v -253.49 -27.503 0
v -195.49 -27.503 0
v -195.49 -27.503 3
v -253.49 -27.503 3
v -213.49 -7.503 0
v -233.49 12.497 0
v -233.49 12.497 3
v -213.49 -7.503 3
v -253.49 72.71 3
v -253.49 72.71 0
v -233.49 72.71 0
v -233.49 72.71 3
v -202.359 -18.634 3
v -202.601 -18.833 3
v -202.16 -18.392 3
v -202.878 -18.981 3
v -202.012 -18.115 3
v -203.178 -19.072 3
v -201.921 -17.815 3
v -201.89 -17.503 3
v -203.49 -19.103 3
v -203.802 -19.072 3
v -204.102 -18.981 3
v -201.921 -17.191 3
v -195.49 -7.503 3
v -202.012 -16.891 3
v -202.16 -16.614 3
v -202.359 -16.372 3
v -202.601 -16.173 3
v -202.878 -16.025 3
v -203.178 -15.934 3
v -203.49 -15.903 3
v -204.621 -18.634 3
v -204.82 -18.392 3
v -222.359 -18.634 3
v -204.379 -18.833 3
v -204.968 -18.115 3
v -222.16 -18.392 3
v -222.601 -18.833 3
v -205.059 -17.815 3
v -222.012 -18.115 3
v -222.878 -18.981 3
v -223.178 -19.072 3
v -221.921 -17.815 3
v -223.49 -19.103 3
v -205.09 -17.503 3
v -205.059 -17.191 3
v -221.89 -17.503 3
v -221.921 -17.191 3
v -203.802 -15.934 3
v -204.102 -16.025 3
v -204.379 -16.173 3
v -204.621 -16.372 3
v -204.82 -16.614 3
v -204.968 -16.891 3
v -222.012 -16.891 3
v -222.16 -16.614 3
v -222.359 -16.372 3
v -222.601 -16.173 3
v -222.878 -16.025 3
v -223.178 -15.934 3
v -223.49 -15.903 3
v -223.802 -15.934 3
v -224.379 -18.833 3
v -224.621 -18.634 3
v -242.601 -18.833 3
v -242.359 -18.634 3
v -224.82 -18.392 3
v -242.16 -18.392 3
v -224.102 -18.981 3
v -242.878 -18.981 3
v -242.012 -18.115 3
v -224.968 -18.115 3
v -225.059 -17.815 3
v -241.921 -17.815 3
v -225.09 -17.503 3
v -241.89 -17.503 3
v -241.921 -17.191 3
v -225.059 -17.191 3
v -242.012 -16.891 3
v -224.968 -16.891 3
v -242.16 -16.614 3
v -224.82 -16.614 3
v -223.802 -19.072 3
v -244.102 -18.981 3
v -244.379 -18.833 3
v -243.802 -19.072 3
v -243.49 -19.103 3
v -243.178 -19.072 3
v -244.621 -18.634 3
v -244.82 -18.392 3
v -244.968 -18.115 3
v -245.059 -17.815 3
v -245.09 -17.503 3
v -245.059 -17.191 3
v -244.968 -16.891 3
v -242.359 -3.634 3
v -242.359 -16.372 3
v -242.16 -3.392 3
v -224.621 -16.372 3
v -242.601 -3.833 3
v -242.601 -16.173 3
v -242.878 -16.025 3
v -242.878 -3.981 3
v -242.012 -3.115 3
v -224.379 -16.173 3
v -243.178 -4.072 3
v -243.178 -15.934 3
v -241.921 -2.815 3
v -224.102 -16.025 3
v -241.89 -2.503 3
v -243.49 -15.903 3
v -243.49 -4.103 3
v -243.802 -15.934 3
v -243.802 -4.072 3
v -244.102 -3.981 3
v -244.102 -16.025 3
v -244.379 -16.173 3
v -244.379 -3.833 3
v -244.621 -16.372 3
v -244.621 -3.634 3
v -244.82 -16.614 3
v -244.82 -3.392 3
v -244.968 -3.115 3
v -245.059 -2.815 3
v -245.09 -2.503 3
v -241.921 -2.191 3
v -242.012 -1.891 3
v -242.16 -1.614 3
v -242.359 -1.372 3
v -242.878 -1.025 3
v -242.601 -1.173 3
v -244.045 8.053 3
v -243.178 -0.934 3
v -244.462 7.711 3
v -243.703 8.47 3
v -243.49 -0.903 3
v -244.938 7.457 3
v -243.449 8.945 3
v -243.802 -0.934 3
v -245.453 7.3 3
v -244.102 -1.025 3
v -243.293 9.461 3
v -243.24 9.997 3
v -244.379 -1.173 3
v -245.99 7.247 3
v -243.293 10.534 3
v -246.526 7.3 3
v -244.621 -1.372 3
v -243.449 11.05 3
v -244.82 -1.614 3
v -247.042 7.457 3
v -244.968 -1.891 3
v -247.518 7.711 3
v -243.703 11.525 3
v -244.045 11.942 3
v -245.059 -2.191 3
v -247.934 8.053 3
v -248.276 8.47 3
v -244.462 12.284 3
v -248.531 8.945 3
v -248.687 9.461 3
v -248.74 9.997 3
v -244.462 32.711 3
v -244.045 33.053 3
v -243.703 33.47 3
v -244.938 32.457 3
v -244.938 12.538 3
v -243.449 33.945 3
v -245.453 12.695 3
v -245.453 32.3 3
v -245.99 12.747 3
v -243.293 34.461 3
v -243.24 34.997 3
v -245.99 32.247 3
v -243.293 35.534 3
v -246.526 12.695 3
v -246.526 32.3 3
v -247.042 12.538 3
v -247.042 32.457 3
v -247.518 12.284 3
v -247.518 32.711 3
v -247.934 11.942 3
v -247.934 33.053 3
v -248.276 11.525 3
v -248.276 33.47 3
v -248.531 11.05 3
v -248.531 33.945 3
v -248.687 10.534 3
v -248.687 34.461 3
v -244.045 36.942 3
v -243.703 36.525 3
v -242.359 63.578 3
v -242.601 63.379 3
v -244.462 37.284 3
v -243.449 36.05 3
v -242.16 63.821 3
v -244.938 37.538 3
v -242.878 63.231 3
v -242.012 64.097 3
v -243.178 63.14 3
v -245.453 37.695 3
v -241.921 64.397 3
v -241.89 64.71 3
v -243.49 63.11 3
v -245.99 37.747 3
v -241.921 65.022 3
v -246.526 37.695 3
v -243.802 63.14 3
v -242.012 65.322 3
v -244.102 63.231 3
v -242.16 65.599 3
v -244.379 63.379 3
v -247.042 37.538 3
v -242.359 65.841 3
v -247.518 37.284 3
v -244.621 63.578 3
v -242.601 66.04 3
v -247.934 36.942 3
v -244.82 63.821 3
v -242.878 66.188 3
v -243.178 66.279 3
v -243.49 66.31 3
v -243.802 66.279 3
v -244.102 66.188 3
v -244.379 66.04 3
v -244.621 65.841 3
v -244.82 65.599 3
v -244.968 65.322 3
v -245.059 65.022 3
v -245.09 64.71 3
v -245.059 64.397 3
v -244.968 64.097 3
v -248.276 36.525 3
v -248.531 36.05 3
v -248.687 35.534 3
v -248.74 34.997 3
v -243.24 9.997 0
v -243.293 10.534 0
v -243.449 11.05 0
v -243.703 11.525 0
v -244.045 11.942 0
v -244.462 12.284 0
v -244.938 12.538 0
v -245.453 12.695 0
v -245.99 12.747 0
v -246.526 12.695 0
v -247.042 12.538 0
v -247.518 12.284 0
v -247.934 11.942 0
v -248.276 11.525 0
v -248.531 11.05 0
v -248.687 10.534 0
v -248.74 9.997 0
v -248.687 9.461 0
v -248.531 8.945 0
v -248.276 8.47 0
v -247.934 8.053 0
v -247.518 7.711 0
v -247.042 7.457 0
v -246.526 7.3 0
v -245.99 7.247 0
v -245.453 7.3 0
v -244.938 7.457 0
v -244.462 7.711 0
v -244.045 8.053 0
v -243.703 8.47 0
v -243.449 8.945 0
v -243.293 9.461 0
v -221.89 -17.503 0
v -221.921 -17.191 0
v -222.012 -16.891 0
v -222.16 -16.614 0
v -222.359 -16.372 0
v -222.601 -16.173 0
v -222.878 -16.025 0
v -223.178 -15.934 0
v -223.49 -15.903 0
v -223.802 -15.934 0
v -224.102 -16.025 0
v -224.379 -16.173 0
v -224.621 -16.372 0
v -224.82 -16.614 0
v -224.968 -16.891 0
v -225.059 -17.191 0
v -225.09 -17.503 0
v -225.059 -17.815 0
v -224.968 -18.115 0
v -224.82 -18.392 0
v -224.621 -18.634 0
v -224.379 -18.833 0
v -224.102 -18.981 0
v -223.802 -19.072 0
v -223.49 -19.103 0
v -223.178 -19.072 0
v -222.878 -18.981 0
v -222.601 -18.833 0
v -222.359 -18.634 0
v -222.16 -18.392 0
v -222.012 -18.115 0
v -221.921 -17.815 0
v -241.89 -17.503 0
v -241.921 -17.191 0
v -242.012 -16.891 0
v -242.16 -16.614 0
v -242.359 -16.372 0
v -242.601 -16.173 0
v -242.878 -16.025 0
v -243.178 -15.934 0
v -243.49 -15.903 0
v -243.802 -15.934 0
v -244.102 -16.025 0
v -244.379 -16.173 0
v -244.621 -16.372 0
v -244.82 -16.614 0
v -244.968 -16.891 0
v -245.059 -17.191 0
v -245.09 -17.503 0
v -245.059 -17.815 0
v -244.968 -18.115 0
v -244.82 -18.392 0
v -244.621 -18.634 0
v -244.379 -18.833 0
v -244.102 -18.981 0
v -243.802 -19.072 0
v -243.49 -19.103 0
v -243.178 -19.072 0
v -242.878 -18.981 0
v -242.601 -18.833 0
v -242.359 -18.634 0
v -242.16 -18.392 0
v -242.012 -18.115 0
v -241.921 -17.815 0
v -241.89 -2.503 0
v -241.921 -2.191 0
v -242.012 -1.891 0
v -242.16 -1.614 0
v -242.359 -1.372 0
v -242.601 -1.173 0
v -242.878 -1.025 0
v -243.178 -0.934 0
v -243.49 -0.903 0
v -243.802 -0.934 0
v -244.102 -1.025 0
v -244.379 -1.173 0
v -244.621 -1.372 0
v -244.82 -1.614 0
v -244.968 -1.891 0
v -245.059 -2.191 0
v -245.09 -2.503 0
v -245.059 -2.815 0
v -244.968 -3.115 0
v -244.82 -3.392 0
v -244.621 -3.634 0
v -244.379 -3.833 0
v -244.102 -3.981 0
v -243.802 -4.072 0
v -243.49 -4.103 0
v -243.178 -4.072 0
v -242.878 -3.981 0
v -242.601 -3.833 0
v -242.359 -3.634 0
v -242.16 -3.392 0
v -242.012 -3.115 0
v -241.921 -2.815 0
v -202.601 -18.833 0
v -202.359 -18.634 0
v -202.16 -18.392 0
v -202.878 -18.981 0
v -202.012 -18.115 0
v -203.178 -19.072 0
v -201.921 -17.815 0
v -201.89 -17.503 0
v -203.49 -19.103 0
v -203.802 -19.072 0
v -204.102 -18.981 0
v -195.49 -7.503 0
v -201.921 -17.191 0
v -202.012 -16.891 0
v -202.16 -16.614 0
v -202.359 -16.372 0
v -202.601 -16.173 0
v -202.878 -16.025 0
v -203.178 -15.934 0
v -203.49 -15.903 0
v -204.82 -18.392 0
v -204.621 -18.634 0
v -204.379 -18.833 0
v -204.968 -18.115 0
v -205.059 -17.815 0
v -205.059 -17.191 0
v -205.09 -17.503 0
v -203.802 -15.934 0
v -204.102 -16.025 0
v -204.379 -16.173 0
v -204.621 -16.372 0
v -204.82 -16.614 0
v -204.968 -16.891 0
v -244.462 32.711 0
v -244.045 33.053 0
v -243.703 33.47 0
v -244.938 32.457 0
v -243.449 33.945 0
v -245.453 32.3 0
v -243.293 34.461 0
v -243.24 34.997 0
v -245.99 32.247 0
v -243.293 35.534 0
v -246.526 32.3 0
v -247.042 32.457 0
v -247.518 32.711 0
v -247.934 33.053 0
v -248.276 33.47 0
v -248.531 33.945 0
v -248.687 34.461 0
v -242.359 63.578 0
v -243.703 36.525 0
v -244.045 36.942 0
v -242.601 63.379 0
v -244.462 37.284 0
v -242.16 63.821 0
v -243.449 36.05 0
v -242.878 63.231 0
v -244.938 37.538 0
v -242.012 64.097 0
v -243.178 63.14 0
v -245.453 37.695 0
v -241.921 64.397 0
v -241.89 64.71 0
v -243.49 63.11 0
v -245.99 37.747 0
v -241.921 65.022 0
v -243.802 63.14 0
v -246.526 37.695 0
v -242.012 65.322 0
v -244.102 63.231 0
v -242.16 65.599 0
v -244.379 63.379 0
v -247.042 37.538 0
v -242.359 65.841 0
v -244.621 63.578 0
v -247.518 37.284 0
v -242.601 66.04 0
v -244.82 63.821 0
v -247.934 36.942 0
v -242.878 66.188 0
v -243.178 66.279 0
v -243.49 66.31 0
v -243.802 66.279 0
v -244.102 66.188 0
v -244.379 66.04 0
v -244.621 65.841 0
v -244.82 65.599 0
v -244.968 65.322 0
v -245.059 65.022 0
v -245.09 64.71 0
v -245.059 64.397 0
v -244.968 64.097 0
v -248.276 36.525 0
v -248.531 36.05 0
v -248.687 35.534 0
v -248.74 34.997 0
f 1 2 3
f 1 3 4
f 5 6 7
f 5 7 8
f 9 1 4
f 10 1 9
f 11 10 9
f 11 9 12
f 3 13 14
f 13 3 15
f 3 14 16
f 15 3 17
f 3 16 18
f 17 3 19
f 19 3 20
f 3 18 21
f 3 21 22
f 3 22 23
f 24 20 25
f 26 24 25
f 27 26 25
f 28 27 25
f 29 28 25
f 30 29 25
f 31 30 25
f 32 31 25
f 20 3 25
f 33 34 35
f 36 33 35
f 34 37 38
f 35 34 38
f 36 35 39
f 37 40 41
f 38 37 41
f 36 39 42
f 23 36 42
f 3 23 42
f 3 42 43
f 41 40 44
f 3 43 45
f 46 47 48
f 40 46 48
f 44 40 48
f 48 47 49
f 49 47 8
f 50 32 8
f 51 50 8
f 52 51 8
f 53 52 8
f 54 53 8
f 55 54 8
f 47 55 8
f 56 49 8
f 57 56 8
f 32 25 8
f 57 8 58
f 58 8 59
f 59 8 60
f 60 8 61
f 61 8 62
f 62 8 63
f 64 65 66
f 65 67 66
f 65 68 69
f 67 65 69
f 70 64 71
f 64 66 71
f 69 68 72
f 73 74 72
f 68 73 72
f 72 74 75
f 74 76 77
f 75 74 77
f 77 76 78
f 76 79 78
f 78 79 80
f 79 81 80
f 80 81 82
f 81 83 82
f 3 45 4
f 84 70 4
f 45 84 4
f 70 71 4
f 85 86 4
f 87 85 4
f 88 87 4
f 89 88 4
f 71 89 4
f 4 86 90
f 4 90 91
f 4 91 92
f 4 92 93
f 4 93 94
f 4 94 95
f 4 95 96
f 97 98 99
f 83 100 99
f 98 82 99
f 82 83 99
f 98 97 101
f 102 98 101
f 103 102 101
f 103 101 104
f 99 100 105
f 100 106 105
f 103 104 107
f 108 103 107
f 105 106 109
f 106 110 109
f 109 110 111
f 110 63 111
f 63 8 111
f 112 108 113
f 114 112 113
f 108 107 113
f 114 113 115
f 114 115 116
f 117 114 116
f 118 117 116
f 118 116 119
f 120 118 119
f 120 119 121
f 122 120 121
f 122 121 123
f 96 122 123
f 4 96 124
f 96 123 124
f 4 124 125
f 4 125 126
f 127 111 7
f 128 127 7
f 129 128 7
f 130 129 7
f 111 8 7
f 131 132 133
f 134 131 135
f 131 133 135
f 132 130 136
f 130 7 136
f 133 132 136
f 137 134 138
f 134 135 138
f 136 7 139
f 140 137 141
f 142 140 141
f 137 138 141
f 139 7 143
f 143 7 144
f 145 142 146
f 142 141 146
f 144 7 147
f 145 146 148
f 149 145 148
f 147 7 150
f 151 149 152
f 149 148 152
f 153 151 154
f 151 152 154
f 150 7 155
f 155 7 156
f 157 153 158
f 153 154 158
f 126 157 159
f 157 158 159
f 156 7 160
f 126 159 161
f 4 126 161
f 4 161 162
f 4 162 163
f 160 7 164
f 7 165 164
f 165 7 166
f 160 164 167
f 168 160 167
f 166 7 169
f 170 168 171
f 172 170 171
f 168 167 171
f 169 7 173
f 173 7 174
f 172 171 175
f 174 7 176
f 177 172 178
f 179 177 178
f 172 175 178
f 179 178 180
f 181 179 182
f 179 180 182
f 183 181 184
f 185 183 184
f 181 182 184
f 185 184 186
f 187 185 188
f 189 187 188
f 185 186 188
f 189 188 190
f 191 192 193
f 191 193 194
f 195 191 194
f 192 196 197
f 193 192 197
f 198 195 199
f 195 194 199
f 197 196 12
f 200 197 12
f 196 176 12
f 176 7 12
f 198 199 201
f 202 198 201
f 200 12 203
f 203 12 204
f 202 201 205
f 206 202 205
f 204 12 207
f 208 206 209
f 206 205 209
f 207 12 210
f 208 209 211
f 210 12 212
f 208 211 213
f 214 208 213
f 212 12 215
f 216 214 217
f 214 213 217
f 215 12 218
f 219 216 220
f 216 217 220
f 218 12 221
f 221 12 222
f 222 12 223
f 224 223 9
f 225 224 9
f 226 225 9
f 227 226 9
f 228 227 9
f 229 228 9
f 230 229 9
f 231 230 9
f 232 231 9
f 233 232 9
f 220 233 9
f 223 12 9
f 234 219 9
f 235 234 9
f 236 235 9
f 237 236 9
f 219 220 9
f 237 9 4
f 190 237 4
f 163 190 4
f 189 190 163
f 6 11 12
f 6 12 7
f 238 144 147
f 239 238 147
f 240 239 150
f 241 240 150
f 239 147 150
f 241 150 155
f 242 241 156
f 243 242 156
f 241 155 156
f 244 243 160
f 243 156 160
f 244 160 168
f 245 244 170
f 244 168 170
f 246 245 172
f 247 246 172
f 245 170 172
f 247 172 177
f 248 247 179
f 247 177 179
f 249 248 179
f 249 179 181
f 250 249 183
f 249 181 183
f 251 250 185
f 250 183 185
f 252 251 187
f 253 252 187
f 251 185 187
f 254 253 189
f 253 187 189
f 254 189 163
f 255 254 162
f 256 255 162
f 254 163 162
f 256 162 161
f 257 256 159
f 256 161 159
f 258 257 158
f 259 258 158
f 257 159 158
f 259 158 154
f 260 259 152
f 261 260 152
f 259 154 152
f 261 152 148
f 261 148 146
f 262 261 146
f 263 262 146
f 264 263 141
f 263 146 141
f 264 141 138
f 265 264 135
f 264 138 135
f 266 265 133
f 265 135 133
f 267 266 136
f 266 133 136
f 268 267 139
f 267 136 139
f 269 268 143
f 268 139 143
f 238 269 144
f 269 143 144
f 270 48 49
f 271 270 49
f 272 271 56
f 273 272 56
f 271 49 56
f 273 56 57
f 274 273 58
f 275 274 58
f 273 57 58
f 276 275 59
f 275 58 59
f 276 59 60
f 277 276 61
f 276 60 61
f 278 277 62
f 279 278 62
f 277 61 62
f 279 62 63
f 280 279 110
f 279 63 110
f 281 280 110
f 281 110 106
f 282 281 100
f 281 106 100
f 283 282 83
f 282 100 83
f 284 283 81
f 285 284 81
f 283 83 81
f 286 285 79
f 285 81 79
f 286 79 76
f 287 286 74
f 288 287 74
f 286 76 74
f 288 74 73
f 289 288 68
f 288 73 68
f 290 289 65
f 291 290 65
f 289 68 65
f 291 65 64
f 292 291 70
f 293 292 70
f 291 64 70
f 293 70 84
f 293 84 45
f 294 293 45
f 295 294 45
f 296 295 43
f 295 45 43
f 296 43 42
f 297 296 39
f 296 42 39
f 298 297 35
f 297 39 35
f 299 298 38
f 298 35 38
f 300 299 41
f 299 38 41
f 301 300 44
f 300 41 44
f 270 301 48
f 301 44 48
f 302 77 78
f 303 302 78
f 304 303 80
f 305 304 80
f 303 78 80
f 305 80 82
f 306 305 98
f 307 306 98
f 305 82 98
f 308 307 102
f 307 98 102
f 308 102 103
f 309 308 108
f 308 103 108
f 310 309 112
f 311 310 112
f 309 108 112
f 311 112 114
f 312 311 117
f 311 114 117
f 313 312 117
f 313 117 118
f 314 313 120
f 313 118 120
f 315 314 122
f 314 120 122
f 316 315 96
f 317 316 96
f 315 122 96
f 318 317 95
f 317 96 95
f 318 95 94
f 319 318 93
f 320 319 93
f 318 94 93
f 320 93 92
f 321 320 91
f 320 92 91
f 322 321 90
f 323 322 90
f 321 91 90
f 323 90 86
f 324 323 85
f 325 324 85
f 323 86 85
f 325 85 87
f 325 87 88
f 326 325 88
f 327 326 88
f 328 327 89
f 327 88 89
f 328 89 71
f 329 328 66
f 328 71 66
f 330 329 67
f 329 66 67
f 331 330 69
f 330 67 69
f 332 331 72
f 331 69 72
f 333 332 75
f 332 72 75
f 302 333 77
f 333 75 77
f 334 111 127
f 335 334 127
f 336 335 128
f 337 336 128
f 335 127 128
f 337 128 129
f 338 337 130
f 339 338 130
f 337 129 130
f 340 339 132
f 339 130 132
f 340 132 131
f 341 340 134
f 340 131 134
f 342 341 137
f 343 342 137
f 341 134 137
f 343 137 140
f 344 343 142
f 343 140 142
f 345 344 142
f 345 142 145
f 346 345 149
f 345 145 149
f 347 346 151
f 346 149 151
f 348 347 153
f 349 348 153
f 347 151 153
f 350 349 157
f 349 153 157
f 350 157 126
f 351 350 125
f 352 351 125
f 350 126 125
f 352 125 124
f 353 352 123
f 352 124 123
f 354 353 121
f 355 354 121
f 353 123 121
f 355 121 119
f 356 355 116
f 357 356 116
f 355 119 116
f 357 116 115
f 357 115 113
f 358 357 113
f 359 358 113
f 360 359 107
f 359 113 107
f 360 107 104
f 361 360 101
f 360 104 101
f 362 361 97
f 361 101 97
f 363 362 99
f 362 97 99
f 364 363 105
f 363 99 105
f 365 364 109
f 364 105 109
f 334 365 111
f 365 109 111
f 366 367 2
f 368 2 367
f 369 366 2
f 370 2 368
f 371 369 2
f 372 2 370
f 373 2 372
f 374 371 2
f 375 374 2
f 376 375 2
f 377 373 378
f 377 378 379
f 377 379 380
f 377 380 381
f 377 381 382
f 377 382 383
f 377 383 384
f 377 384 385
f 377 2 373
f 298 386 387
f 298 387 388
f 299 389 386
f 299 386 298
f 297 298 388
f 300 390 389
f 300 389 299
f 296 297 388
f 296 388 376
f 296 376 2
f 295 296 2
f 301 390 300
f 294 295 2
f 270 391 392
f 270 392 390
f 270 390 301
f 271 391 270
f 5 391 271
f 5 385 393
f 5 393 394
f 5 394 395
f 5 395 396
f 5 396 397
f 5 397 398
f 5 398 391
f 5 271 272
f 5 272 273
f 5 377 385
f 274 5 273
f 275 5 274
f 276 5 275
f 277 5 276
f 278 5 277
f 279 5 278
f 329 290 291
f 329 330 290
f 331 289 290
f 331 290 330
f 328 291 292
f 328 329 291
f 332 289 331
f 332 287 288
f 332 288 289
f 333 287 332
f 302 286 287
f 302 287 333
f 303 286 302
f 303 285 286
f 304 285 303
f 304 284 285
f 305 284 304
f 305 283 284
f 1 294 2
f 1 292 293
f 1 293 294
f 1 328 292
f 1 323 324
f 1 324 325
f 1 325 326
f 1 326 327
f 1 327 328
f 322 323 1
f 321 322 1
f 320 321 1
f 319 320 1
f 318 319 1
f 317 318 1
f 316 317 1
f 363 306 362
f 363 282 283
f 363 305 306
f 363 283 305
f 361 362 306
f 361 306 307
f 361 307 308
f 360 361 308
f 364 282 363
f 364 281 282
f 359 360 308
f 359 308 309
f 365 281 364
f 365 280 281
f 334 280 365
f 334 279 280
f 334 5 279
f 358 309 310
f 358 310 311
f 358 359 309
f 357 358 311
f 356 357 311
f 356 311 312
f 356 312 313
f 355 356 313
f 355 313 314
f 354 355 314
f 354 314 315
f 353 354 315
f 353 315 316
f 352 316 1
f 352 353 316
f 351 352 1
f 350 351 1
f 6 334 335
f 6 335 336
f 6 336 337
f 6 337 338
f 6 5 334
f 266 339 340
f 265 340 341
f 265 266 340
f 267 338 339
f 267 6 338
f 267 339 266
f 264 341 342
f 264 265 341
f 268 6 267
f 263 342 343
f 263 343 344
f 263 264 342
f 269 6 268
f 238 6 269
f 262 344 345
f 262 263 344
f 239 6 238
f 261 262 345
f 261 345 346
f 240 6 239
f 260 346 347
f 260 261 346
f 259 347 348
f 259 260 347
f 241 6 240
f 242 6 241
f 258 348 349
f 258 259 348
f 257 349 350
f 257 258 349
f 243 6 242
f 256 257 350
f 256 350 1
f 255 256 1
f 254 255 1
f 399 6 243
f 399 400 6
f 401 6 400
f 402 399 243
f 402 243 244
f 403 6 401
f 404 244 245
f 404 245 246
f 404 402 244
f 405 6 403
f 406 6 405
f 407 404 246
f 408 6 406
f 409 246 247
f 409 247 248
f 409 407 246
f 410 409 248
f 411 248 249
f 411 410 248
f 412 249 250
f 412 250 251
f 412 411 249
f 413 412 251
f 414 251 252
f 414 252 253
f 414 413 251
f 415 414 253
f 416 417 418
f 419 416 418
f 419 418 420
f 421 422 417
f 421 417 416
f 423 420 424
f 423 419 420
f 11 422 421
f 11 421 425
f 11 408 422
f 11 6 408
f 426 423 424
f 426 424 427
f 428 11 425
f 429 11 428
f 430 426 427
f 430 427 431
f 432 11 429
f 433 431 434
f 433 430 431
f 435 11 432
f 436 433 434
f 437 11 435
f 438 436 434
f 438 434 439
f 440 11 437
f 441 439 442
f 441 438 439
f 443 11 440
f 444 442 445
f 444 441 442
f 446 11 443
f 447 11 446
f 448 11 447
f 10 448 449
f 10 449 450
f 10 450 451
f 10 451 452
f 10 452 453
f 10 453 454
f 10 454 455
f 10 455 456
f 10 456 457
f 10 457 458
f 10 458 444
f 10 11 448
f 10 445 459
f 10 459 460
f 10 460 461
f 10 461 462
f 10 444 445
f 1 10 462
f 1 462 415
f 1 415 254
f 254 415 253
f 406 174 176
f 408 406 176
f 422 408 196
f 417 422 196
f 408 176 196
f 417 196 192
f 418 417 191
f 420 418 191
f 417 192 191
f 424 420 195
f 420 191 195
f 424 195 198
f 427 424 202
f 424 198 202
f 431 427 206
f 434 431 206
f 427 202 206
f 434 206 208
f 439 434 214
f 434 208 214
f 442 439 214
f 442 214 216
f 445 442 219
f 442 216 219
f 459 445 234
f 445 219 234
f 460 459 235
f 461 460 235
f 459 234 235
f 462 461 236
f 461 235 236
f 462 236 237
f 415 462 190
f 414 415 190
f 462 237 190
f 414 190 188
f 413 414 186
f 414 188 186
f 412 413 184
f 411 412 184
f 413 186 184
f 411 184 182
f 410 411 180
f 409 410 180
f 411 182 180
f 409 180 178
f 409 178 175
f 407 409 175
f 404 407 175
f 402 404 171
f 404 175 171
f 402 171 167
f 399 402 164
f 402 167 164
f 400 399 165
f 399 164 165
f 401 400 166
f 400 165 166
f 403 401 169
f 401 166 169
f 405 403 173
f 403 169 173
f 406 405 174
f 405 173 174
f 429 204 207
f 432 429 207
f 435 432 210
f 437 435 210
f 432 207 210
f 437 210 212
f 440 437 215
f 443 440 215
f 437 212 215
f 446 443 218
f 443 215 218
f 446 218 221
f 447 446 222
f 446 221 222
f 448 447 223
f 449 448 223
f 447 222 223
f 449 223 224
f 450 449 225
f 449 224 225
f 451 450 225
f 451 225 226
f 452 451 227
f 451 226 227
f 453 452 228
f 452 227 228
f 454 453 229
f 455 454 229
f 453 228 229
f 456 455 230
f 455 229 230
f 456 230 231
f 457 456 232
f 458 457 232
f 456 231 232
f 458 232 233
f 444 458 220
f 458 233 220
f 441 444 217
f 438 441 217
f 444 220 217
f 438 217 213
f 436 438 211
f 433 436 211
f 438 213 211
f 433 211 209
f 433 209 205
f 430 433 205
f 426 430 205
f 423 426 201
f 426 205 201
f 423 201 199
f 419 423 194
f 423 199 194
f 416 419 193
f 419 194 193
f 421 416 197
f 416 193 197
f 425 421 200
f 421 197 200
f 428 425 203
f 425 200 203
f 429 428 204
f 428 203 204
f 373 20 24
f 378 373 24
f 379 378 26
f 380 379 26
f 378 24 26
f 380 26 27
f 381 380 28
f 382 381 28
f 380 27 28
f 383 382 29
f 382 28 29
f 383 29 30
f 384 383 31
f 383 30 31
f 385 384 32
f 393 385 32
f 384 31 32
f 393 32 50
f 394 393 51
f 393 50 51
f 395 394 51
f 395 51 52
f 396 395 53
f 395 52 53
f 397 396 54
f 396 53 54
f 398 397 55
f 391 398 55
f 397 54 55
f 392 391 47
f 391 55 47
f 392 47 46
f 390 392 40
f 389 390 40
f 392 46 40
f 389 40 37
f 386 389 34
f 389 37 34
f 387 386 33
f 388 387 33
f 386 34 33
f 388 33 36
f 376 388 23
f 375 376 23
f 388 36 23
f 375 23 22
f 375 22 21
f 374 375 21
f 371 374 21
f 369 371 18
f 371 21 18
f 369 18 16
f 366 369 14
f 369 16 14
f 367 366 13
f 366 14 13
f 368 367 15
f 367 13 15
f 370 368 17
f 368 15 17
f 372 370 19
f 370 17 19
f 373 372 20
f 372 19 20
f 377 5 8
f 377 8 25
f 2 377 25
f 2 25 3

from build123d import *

# Parameters (mm, degrees)
EXTRUDE1_DEPTH     = 3
SKETCH2_R          = 1.6
SKETCH2_R_2        = 2.75
CUT_EXTRUDE1_DEPTH = 3


with BuildPart() as part:
    # Sketch1 → Extrude1 (new body)
    with BuildSketch(Plane.XY):
        Polygon((-195.489923187, -7.502951786), (-195.489923187, -27.502951786), (-253.489921235, -27.502951786), (-253.489921235, 72.709593142), (-233.489921235, 72.709593142), (-233.489921235, 12.497048214), (-213.489921235, -7.502951786), align=None)
    extrude(amount=EXTRUDE1_DEPTH)

    # Sketch2 → Cut-Extrude1 (cut)
    with BuildSketch(Plane.XY.offset(3)):
        with Locations((-203.489923187, -17.502951786)):
            Circle(SKETCH2_R)
        with Locations((-223.489923187, -17.502951786)):
            Circle(SKETCH2_R)
        with Locations((-243.489923187, -17.502951786)):
            Circle(SKETCH2_R)
        with Locations((-243.489923187, -2.502951786)):
            Circle(SKETCH2_R)
        with Locations((-245.989921235, 9.997448214)):
            Circle(SKETCH2_R_2)
        with Locations((-245.989921235, 34.997448214)):
            Circle(SKETCH2_R_2)
        with Locations((-243.489923187, 64.709593142)):
            Circle(SKETCH2_R)
    extrude(amount=-CUT_EXTRUDE1_DEPTH, mode=Mode.SUBTRACT)


solid = part.part
